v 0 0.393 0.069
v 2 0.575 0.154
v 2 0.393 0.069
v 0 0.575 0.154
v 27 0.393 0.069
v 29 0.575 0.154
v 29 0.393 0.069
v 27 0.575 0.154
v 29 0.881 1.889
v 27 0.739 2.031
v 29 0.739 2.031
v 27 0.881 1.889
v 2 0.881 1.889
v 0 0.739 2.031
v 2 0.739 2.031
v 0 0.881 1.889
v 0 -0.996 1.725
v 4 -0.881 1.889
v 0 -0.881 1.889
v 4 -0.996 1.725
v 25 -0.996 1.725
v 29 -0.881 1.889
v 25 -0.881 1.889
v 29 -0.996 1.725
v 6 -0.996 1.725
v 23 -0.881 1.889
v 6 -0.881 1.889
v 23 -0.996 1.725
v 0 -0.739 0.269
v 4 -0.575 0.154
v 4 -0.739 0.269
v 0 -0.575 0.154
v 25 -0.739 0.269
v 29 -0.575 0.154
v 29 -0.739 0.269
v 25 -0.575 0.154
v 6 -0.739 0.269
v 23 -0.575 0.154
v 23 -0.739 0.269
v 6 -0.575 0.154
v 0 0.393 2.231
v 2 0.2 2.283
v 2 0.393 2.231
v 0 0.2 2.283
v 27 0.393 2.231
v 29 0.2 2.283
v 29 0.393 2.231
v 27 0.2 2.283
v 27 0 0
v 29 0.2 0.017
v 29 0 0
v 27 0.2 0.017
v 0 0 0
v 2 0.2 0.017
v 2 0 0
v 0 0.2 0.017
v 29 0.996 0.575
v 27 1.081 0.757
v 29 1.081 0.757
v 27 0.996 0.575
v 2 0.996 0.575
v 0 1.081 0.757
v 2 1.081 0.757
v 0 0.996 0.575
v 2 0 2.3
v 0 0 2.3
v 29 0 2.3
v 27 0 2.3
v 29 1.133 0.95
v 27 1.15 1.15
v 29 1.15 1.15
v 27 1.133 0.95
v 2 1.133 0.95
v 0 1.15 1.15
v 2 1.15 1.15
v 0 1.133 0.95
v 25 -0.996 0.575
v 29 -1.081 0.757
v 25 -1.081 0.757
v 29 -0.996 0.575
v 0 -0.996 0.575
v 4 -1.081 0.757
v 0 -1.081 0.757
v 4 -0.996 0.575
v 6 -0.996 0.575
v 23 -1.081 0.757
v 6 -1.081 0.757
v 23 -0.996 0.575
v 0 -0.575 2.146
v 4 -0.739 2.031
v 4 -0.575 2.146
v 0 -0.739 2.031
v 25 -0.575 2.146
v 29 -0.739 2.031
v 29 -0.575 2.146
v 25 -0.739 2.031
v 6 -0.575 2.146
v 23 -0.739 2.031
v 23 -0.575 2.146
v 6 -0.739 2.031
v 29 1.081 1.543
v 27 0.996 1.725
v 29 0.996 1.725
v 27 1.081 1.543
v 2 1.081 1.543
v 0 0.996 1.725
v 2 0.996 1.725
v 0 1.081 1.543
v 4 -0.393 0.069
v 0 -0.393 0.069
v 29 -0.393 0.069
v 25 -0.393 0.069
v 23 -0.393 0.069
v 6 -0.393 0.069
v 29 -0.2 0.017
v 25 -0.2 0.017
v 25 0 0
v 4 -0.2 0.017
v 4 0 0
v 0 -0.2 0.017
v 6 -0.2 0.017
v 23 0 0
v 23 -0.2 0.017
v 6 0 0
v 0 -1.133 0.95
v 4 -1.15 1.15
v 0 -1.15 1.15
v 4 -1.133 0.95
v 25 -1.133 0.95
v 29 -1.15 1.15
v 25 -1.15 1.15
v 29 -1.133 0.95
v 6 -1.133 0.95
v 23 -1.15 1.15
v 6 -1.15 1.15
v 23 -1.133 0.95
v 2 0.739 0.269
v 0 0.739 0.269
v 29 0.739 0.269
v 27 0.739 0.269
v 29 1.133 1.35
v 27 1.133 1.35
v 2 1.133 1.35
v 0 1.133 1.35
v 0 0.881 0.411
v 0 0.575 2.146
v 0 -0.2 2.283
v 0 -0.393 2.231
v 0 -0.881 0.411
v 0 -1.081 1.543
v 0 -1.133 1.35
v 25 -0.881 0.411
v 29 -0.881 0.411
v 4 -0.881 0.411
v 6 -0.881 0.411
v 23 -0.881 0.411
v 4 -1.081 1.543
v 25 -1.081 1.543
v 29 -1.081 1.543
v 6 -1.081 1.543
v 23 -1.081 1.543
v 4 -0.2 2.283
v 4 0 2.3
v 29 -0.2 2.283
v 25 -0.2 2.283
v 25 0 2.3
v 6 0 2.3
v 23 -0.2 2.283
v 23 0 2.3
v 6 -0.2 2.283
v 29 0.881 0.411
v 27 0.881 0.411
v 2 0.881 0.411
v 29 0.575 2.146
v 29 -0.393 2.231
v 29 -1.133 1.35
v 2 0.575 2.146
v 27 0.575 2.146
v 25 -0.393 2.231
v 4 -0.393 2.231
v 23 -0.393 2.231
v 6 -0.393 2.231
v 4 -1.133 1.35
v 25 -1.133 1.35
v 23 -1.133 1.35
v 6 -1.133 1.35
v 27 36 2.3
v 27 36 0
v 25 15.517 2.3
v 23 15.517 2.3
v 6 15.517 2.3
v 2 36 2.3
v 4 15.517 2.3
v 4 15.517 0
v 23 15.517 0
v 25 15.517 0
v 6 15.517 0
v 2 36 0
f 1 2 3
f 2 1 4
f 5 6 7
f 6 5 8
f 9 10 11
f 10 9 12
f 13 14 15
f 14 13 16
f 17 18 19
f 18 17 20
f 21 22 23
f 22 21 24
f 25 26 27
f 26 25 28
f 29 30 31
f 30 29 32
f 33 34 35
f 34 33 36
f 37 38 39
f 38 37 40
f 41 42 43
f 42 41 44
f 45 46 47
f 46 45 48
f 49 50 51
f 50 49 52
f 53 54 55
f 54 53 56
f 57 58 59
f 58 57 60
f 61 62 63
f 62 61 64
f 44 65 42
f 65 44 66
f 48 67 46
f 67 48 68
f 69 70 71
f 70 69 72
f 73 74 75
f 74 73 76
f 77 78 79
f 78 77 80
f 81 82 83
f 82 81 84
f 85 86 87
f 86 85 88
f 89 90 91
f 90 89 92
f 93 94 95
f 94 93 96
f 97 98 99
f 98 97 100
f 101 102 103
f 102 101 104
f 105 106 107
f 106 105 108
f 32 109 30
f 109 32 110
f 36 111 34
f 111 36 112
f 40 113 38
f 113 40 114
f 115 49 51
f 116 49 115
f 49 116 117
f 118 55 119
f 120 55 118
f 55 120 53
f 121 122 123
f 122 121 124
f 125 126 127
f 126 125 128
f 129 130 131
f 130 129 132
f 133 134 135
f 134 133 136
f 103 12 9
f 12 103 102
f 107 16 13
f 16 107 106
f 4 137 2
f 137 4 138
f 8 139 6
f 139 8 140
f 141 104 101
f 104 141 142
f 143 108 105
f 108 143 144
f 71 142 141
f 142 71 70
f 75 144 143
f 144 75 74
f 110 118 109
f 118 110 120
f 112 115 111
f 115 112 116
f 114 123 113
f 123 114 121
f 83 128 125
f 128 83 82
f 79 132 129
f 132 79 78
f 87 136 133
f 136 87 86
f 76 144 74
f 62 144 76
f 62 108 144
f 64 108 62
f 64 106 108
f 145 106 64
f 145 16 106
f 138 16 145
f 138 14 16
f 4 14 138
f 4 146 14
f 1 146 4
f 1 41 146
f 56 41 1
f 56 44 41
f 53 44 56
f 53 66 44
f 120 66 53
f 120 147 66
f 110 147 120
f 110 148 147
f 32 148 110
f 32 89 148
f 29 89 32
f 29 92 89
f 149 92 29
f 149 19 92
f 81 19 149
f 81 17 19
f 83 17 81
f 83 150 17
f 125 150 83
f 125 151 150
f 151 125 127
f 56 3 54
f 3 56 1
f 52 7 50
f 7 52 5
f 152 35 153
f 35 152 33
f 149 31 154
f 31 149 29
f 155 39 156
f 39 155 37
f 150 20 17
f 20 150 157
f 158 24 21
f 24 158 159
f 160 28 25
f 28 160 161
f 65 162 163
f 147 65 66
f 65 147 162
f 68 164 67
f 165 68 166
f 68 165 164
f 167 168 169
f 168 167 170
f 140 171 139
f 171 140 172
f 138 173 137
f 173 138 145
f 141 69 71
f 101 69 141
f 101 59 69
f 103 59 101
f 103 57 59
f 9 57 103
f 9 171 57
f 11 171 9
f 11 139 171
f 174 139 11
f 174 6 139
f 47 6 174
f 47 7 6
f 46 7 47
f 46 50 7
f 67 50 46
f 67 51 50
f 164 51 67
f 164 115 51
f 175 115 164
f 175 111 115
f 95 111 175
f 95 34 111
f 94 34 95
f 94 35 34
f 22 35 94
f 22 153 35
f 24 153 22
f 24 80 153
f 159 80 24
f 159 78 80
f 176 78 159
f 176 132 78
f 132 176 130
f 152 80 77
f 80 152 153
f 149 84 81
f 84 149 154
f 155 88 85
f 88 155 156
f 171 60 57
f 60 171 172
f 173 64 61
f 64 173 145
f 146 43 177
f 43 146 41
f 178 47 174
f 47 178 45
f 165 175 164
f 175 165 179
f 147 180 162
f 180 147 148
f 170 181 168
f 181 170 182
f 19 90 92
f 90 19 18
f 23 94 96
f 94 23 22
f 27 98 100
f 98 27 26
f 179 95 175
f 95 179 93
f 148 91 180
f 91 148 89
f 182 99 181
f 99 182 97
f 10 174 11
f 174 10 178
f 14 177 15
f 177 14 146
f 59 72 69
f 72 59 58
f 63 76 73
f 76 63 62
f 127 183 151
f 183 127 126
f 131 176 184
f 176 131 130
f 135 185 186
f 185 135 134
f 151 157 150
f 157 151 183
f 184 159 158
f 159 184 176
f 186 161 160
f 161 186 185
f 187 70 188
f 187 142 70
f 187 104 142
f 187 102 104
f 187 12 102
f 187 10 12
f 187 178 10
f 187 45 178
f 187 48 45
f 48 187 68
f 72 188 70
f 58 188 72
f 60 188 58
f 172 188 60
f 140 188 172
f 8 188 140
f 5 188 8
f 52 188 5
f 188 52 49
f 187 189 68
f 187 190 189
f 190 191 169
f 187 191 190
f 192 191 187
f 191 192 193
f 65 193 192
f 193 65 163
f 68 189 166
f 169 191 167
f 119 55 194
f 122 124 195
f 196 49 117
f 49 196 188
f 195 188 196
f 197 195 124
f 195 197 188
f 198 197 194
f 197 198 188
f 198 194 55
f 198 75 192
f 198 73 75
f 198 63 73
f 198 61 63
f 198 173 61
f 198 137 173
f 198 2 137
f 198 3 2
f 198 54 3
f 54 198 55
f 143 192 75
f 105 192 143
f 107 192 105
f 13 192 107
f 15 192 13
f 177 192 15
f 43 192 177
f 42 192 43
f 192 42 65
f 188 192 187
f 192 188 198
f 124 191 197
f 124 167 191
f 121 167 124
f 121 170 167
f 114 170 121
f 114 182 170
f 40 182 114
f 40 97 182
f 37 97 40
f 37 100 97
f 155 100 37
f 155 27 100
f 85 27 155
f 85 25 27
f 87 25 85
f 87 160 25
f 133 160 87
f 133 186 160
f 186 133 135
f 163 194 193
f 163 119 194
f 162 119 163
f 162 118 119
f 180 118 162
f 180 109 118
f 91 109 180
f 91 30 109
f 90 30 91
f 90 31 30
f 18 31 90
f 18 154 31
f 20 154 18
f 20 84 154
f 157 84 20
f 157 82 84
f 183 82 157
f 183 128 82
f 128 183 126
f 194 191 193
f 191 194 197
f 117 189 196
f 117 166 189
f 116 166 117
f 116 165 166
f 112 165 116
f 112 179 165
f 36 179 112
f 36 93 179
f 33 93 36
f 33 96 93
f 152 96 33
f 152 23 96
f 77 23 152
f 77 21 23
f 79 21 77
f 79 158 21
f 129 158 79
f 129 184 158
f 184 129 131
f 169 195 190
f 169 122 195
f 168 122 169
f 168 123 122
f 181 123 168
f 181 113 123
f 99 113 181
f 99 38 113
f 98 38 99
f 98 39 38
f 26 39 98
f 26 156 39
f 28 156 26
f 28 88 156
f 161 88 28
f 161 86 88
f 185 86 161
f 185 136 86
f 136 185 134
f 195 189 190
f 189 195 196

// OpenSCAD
//Logitech Media Keyboard 600

$fn=36;

//Breite
width=25;

//Durchmesser Löcher
d=2.3;

//Länge
length=18*2;

//Feder und/oder Spalte
f=2;

//Feder Länge
fl=10;

//Tichkness
t=d;

module part()
{
translate([0,0,d/2])
rotate([0,90,0])
cylinder(width+2*f, d/2, d/2);

translate([f,0,0])
cube([width, length, t]);
}

module cuts()
{
translate([f*2,-d/2,0])
color("red")
cube([f,fl*1.66666,t]);

translate([width-f,-d/2,0])
color("red")
cube([f,fl*1.66666,t]);
}

difference() {
    part();
    cuts();
}
